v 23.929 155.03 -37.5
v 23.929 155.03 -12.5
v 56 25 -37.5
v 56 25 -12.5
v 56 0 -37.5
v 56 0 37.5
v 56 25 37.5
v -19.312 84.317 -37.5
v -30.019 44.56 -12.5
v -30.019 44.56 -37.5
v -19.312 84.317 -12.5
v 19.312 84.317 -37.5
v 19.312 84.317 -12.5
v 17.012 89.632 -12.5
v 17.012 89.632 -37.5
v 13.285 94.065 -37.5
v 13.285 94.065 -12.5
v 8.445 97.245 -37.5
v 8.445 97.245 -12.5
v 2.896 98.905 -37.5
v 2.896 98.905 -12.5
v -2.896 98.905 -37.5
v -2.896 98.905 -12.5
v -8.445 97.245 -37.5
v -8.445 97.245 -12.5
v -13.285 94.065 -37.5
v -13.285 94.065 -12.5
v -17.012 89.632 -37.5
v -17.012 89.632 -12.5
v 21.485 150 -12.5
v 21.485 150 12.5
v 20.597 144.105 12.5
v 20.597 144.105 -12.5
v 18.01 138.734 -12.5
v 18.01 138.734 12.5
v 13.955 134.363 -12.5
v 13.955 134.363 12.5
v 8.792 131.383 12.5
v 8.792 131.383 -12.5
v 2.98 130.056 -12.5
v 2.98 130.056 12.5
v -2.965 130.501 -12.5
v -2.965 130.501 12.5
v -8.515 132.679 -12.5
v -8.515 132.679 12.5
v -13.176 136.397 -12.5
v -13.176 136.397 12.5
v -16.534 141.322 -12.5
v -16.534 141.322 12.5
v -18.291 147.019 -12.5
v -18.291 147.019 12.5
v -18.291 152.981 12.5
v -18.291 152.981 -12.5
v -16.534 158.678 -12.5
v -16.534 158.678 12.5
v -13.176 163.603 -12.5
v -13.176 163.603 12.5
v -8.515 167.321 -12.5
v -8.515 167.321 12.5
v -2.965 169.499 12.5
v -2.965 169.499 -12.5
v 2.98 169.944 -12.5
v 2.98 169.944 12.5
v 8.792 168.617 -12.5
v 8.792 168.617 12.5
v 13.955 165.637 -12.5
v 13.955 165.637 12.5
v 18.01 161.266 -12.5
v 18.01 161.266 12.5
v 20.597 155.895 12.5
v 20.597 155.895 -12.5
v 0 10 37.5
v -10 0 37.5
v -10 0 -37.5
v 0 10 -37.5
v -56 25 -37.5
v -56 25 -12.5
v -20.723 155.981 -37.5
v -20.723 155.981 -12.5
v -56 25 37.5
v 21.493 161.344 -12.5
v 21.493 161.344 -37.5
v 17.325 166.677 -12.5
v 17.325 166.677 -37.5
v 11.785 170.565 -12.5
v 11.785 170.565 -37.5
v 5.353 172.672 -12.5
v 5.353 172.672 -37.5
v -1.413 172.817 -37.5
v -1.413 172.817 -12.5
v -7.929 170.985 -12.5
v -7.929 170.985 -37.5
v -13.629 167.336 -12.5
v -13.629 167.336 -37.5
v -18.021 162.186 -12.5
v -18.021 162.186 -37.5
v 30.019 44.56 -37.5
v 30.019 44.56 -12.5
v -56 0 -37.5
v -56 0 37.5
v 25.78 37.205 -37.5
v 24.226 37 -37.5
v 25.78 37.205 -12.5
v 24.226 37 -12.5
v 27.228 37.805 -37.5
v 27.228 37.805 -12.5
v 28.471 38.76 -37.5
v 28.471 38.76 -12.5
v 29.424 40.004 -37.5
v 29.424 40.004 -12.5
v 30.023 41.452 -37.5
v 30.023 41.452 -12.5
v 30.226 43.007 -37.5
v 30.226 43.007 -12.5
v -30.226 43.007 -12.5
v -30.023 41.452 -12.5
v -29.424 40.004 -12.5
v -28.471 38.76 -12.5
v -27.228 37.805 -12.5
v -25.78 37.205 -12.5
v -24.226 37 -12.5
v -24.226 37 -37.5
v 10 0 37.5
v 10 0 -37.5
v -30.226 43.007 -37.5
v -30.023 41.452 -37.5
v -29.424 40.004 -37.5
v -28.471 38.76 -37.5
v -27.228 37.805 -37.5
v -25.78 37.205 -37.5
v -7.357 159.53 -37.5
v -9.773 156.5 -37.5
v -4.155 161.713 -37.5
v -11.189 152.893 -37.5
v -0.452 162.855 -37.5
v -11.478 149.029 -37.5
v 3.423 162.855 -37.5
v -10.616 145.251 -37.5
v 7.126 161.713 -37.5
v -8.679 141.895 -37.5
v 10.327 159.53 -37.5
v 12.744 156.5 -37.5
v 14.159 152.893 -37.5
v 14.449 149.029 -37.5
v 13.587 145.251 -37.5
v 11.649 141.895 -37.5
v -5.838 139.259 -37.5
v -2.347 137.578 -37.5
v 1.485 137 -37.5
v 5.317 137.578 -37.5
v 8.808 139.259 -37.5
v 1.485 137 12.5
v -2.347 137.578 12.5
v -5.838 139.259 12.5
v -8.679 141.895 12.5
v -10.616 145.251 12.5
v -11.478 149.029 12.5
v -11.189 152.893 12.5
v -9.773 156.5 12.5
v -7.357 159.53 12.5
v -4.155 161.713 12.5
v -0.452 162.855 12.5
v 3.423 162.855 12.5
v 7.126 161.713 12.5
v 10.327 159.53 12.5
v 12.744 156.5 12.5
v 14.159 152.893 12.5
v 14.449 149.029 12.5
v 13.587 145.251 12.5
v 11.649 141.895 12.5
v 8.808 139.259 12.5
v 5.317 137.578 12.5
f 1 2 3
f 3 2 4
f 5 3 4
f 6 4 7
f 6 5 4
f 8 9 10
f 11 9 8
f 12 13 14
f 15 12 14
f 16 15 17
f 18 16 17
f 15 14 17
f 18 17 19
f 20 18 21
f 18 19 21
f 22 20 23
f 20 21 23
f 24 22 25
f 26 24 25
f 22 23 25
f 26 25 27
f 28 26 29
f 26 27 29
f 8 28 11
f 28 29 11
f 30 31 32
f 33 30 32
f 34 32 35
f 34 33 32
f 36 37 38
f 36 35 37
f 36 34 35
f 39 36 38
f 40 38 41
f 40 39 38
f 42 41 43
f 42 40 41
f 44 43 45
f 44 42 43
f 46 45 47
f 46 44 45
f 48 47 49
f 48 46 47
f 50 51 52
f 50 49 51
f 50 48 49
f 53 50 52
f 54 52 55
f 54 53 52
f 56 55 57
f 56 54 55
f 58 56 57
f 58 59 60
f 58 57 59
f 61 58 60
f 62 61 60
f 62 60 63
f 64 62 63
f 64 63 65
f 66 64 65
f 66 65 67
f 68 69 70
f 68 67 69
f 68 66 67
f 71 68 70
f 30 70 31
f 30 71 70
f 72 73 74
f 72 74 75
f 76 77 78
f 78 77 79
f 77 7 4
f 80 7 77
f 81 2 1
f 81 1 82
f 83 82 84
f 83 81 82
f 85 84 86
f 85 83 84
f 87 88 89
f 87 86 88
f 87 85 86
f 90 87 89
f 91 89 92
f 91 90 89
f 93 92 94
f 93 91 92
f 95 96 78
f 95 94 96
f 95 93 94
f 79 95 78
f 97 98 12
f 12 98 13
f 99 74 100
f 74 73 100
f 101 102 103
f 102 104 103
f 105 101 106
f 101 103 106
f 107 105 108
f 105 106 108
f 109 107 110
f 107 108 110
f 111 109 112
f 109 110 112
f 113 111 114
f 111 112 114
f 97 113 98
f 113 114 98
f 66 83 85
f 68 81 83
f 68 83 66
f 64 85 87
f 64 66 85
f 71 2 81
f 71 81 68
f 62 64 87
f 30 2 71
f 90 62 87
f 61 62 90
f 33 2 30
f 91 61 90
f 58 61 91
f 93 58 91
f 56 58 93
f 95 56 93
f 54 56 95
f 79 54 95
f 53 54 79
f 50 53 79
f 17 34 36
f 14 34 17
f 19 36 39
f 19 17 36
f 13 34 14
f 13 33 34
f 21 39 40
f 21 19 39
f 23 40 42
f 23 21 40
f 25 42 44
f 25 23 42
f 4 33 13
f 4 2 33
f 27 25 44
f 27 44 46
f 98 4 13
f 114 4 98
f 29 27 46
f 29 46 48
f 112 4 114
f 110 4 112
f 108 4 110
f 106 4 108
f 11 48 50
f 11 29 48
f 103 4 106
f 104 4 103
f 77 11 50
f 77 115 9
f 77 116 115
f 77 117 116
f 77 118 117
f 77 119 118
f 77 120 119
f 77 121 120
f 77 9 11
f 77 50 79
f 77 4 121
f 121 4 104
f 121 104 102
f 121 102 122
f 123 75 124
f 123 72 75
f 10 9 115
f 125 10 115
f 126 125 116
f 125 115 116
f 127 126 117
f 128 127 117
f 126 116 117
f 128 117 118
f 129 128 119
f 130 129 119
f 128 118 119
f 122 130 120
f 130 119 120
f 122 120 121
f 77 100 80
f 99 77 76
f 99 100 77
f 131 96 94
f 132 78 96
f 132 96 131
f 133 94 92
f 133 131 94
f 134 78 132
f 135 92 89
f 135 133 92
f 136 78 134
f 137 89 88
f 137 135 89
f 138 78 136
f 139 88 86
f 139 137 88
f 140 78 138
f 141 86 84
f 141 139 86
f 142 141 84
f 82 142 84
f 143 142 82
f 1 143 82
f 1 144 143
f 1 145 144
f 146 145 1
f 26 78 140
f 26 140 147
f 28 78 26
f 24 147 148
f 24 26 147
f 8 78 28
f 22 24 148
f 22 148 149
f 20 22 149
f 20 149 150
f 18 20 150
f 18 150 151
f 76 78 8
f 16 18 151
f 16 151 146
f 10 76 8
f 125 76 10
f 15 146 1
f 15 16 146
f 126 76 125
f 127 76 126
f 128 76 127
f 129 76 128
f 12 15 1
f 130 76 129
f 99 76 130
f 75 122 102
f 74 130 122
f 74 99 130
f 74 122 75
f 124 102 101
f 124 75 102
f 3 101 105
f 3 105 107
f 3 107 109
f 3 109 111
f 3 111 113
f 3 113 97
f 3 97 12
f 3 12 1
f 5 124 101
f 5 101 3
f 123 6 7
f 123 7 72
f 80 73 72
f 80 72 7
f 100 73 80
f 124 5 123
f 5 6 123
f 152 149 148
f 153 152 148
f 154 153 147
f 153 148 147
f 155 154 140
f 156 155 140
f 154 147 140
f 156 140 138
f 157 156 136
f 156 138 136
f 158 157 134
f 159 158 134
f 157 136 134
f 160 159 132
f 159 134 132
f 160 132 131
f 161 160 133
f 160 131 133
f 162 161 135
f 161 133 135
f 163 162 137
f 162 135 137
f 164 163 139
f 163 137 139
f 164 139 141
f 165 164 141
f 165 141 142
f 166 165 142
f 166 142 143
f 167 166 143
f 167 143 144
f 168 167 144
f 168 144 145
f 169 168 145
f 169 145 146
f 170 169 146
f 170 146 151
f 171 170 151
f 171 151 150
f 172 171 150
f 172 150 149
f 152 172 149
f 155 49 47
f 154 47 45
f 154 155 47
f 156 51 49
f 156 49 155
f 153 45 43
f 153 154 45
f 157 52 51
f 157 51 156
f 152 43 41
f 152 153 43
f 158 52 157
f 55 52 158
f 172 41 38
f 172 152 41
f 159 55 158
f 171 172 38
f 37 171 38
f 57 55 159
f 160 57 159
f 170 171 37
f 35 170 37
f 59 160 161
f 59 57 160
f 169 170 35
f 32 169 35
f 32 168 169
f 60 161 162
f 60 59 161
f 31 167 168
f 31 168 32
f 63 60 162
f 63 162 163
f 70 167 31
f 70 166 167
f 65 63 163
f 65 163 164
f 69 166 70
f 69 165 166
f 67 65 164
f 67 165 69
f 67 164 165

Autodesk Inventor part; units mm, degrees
ref_plane "YZ Plane" through (0, 0, 0) normal (1, 0, 0) x (0, 1, 0)
ref_plane "XZ Plane" through (0, 0, 0) normal (0, 1, 0) x (-1, 0, 0)
ref_plane "XY Plane" through (0, 0, 0) normal (0, 0, 1) x (1, 0, 0)
sketch "Szkic1" plane through (0, 0, 0) normal (0, 1, 0) x (-1, 0, 0)
  line L0 (56, -37.5) -> (-56, -37.5)
  line L1 (-56, -37.5) -> (-56, 37.5)
  line L2 (-56, 37.5) -> (56, 37.5)
  line L3 (56, 37.5) -> (56, -37.5)
  line L4 (56, -37.5) -> (-56, 37.5) construction
  line L5 (-56, -37.5) -> (56, 37.5) construction
  point P0 (0, 0)
  dimension "d0" = 112
  dimension "d1" = 75
extrude "Wyciągnięcie proste1" add sketch "Szkic1" along normal blind 25
sketch "Szkic2" plane through (0, 25, 0) normal (0, 1, 0) x (1, 0, 0)
  line L0 (56, 37.5) -> (-56, 37.5) projected
  line L1 (56, -37.5) -> (56, 37.5) projected
  line L2 (-56, 37.5) -> (56, 37.5)
  line L3 (56, 37.5) -> (56, 12.5)
  line L4 (56, 12.5) -> (-56, 12.5)
  line L5 (-56, 12.5) -> (-56, 37.5)
  point P0 (0, 0)
  dimension "d4" = 25
extrude "Wyciągnięcie proste2" add sketch "Szkic2" along normal blind 148
sketch "Szkic3" plane through (-56, 25, -12.5) normal (0, 0, 1) x (1, 0, 0)
  circle A0 centre (57.4852, 125) radius 23
  line L0 (0, 0) -> (112, 0) projected
  line L1 (112, -25) -> (112, 148) projected
  line L2 (0, -25) -> (0, 148) projected
  line L3 (0, 0) -> (0, 148)
  line L4 (0, 148) -> (112, 148) projected
  line L5 (0, 148) -> (112, 148)
  line L6 (112, 148) -> (112, 0)
  line L7 (0, 0) -> (35.2766, 130.9813)
  line L8 (79.6938, 130.9813) -> (112, 0)
  point P0 (56, -25)
  point P1 (79.928, 130.0318)
  point P2 (57.4852, 148)
  dimension "d8" = 46
extrude "Wyciągnięcie proste3" cut sketch "Szkic3" against normal blind 25 contours L7 L2 L4 A0 | L4 L1 L8 A0
sketch "Szkic4" plane through (-56, 25, -12.5) normal (0, 0, 1) x (1, 0, 0)
  arc A0 (79.928, 130.0318) -> (35.2766, 130.9813) centre (57.4852, 125) ccw projected
  circle A1 centre (57.4852, 125) radius 20
  point P0 (56, -25)
  dimension "d11" = 40
extrude "Wyciągnięcie proste4" add sketch "Szkic4" along normal blind 25
sketch "Szkic5" plane through (-56, 25, -12.5) normal (0, 0, 1) x (1, 0, 0)
  line L0 (56, 12) -> (31.7743, 12)
  line L1 (25.9808, 19.5604) -> (42.2104, 79.8208)
  line L2 (0, 0) -> (112, 0) projected
  line L3 (35.2766, 130.9813) -> (0, 0) projected
  arc A0 (25.9808, 19.5604) -> (31.7743, 12) centre (31.7743, 18) ccw
  circle A1 centre (57.4852, 125) radius 20 projected
  line L4 (56, 12) -> (80.2257, 12)
  line L5 (86.0192, 19.5604) -> (69.7896, 79.8208)
  arc A2 (80.2257, 12) -> (86.0192, 19.5604) centre (80.2257, 18) ccw
  circle A3 centre (56, 54.1155) radius 20
  point P0 (56, -25)
  point P1 (75.3119, 59.3167)
  point P2 (36.6881, 59.3167)
  dimension "d14" = 12
  dimension "d15" = 20
  dimension "d16" = 6
  dimension "d17" = 40
extrude "Wyciągnięcie proste5" cut sketch "Szkic5" against normal blind 25 contours L0 A0 L1 A3 L5 A2 L4 | A3
sketch "Szkic6" plane through (1.4852, 150, 12.5) normal (0, 0, 1) x (1, 0, 0)
  point P0 (-1.4852, -150)
  point P1 (0, 0)
hole "Otwór1" at (1.4852, 150, 12.5) direction (0, 0, -1) diameter 26 end through all
sketch "Szkic7" plane through (0, 0, 0) normal (0, -1, 0) x (1, 0, 0)
  point P0 (0, 0)
sketch "Szkic8" plane through (-56, 0, 37.5) normal (0, 0, 1) x (1, 0, 0)
  line L0 (112, 0) -> (0, 0) projected
  line L1 (46, 0) -> (66, 0)
  line L2 (0, 0) -> (112, 0) projected
  line L3 (46, 0) -> (56, 10)
  line L4 (46, 0) -> (60.1421, 0) construction
  line L5 (56, 10) -> (66, 0)
  point P0 (56, 0)
  dimension "d27" = 20
  dimension "d28" = 45
extrude "Wyciągnięcie proste6" cut sketch "Szkic8" against normal blind 75
